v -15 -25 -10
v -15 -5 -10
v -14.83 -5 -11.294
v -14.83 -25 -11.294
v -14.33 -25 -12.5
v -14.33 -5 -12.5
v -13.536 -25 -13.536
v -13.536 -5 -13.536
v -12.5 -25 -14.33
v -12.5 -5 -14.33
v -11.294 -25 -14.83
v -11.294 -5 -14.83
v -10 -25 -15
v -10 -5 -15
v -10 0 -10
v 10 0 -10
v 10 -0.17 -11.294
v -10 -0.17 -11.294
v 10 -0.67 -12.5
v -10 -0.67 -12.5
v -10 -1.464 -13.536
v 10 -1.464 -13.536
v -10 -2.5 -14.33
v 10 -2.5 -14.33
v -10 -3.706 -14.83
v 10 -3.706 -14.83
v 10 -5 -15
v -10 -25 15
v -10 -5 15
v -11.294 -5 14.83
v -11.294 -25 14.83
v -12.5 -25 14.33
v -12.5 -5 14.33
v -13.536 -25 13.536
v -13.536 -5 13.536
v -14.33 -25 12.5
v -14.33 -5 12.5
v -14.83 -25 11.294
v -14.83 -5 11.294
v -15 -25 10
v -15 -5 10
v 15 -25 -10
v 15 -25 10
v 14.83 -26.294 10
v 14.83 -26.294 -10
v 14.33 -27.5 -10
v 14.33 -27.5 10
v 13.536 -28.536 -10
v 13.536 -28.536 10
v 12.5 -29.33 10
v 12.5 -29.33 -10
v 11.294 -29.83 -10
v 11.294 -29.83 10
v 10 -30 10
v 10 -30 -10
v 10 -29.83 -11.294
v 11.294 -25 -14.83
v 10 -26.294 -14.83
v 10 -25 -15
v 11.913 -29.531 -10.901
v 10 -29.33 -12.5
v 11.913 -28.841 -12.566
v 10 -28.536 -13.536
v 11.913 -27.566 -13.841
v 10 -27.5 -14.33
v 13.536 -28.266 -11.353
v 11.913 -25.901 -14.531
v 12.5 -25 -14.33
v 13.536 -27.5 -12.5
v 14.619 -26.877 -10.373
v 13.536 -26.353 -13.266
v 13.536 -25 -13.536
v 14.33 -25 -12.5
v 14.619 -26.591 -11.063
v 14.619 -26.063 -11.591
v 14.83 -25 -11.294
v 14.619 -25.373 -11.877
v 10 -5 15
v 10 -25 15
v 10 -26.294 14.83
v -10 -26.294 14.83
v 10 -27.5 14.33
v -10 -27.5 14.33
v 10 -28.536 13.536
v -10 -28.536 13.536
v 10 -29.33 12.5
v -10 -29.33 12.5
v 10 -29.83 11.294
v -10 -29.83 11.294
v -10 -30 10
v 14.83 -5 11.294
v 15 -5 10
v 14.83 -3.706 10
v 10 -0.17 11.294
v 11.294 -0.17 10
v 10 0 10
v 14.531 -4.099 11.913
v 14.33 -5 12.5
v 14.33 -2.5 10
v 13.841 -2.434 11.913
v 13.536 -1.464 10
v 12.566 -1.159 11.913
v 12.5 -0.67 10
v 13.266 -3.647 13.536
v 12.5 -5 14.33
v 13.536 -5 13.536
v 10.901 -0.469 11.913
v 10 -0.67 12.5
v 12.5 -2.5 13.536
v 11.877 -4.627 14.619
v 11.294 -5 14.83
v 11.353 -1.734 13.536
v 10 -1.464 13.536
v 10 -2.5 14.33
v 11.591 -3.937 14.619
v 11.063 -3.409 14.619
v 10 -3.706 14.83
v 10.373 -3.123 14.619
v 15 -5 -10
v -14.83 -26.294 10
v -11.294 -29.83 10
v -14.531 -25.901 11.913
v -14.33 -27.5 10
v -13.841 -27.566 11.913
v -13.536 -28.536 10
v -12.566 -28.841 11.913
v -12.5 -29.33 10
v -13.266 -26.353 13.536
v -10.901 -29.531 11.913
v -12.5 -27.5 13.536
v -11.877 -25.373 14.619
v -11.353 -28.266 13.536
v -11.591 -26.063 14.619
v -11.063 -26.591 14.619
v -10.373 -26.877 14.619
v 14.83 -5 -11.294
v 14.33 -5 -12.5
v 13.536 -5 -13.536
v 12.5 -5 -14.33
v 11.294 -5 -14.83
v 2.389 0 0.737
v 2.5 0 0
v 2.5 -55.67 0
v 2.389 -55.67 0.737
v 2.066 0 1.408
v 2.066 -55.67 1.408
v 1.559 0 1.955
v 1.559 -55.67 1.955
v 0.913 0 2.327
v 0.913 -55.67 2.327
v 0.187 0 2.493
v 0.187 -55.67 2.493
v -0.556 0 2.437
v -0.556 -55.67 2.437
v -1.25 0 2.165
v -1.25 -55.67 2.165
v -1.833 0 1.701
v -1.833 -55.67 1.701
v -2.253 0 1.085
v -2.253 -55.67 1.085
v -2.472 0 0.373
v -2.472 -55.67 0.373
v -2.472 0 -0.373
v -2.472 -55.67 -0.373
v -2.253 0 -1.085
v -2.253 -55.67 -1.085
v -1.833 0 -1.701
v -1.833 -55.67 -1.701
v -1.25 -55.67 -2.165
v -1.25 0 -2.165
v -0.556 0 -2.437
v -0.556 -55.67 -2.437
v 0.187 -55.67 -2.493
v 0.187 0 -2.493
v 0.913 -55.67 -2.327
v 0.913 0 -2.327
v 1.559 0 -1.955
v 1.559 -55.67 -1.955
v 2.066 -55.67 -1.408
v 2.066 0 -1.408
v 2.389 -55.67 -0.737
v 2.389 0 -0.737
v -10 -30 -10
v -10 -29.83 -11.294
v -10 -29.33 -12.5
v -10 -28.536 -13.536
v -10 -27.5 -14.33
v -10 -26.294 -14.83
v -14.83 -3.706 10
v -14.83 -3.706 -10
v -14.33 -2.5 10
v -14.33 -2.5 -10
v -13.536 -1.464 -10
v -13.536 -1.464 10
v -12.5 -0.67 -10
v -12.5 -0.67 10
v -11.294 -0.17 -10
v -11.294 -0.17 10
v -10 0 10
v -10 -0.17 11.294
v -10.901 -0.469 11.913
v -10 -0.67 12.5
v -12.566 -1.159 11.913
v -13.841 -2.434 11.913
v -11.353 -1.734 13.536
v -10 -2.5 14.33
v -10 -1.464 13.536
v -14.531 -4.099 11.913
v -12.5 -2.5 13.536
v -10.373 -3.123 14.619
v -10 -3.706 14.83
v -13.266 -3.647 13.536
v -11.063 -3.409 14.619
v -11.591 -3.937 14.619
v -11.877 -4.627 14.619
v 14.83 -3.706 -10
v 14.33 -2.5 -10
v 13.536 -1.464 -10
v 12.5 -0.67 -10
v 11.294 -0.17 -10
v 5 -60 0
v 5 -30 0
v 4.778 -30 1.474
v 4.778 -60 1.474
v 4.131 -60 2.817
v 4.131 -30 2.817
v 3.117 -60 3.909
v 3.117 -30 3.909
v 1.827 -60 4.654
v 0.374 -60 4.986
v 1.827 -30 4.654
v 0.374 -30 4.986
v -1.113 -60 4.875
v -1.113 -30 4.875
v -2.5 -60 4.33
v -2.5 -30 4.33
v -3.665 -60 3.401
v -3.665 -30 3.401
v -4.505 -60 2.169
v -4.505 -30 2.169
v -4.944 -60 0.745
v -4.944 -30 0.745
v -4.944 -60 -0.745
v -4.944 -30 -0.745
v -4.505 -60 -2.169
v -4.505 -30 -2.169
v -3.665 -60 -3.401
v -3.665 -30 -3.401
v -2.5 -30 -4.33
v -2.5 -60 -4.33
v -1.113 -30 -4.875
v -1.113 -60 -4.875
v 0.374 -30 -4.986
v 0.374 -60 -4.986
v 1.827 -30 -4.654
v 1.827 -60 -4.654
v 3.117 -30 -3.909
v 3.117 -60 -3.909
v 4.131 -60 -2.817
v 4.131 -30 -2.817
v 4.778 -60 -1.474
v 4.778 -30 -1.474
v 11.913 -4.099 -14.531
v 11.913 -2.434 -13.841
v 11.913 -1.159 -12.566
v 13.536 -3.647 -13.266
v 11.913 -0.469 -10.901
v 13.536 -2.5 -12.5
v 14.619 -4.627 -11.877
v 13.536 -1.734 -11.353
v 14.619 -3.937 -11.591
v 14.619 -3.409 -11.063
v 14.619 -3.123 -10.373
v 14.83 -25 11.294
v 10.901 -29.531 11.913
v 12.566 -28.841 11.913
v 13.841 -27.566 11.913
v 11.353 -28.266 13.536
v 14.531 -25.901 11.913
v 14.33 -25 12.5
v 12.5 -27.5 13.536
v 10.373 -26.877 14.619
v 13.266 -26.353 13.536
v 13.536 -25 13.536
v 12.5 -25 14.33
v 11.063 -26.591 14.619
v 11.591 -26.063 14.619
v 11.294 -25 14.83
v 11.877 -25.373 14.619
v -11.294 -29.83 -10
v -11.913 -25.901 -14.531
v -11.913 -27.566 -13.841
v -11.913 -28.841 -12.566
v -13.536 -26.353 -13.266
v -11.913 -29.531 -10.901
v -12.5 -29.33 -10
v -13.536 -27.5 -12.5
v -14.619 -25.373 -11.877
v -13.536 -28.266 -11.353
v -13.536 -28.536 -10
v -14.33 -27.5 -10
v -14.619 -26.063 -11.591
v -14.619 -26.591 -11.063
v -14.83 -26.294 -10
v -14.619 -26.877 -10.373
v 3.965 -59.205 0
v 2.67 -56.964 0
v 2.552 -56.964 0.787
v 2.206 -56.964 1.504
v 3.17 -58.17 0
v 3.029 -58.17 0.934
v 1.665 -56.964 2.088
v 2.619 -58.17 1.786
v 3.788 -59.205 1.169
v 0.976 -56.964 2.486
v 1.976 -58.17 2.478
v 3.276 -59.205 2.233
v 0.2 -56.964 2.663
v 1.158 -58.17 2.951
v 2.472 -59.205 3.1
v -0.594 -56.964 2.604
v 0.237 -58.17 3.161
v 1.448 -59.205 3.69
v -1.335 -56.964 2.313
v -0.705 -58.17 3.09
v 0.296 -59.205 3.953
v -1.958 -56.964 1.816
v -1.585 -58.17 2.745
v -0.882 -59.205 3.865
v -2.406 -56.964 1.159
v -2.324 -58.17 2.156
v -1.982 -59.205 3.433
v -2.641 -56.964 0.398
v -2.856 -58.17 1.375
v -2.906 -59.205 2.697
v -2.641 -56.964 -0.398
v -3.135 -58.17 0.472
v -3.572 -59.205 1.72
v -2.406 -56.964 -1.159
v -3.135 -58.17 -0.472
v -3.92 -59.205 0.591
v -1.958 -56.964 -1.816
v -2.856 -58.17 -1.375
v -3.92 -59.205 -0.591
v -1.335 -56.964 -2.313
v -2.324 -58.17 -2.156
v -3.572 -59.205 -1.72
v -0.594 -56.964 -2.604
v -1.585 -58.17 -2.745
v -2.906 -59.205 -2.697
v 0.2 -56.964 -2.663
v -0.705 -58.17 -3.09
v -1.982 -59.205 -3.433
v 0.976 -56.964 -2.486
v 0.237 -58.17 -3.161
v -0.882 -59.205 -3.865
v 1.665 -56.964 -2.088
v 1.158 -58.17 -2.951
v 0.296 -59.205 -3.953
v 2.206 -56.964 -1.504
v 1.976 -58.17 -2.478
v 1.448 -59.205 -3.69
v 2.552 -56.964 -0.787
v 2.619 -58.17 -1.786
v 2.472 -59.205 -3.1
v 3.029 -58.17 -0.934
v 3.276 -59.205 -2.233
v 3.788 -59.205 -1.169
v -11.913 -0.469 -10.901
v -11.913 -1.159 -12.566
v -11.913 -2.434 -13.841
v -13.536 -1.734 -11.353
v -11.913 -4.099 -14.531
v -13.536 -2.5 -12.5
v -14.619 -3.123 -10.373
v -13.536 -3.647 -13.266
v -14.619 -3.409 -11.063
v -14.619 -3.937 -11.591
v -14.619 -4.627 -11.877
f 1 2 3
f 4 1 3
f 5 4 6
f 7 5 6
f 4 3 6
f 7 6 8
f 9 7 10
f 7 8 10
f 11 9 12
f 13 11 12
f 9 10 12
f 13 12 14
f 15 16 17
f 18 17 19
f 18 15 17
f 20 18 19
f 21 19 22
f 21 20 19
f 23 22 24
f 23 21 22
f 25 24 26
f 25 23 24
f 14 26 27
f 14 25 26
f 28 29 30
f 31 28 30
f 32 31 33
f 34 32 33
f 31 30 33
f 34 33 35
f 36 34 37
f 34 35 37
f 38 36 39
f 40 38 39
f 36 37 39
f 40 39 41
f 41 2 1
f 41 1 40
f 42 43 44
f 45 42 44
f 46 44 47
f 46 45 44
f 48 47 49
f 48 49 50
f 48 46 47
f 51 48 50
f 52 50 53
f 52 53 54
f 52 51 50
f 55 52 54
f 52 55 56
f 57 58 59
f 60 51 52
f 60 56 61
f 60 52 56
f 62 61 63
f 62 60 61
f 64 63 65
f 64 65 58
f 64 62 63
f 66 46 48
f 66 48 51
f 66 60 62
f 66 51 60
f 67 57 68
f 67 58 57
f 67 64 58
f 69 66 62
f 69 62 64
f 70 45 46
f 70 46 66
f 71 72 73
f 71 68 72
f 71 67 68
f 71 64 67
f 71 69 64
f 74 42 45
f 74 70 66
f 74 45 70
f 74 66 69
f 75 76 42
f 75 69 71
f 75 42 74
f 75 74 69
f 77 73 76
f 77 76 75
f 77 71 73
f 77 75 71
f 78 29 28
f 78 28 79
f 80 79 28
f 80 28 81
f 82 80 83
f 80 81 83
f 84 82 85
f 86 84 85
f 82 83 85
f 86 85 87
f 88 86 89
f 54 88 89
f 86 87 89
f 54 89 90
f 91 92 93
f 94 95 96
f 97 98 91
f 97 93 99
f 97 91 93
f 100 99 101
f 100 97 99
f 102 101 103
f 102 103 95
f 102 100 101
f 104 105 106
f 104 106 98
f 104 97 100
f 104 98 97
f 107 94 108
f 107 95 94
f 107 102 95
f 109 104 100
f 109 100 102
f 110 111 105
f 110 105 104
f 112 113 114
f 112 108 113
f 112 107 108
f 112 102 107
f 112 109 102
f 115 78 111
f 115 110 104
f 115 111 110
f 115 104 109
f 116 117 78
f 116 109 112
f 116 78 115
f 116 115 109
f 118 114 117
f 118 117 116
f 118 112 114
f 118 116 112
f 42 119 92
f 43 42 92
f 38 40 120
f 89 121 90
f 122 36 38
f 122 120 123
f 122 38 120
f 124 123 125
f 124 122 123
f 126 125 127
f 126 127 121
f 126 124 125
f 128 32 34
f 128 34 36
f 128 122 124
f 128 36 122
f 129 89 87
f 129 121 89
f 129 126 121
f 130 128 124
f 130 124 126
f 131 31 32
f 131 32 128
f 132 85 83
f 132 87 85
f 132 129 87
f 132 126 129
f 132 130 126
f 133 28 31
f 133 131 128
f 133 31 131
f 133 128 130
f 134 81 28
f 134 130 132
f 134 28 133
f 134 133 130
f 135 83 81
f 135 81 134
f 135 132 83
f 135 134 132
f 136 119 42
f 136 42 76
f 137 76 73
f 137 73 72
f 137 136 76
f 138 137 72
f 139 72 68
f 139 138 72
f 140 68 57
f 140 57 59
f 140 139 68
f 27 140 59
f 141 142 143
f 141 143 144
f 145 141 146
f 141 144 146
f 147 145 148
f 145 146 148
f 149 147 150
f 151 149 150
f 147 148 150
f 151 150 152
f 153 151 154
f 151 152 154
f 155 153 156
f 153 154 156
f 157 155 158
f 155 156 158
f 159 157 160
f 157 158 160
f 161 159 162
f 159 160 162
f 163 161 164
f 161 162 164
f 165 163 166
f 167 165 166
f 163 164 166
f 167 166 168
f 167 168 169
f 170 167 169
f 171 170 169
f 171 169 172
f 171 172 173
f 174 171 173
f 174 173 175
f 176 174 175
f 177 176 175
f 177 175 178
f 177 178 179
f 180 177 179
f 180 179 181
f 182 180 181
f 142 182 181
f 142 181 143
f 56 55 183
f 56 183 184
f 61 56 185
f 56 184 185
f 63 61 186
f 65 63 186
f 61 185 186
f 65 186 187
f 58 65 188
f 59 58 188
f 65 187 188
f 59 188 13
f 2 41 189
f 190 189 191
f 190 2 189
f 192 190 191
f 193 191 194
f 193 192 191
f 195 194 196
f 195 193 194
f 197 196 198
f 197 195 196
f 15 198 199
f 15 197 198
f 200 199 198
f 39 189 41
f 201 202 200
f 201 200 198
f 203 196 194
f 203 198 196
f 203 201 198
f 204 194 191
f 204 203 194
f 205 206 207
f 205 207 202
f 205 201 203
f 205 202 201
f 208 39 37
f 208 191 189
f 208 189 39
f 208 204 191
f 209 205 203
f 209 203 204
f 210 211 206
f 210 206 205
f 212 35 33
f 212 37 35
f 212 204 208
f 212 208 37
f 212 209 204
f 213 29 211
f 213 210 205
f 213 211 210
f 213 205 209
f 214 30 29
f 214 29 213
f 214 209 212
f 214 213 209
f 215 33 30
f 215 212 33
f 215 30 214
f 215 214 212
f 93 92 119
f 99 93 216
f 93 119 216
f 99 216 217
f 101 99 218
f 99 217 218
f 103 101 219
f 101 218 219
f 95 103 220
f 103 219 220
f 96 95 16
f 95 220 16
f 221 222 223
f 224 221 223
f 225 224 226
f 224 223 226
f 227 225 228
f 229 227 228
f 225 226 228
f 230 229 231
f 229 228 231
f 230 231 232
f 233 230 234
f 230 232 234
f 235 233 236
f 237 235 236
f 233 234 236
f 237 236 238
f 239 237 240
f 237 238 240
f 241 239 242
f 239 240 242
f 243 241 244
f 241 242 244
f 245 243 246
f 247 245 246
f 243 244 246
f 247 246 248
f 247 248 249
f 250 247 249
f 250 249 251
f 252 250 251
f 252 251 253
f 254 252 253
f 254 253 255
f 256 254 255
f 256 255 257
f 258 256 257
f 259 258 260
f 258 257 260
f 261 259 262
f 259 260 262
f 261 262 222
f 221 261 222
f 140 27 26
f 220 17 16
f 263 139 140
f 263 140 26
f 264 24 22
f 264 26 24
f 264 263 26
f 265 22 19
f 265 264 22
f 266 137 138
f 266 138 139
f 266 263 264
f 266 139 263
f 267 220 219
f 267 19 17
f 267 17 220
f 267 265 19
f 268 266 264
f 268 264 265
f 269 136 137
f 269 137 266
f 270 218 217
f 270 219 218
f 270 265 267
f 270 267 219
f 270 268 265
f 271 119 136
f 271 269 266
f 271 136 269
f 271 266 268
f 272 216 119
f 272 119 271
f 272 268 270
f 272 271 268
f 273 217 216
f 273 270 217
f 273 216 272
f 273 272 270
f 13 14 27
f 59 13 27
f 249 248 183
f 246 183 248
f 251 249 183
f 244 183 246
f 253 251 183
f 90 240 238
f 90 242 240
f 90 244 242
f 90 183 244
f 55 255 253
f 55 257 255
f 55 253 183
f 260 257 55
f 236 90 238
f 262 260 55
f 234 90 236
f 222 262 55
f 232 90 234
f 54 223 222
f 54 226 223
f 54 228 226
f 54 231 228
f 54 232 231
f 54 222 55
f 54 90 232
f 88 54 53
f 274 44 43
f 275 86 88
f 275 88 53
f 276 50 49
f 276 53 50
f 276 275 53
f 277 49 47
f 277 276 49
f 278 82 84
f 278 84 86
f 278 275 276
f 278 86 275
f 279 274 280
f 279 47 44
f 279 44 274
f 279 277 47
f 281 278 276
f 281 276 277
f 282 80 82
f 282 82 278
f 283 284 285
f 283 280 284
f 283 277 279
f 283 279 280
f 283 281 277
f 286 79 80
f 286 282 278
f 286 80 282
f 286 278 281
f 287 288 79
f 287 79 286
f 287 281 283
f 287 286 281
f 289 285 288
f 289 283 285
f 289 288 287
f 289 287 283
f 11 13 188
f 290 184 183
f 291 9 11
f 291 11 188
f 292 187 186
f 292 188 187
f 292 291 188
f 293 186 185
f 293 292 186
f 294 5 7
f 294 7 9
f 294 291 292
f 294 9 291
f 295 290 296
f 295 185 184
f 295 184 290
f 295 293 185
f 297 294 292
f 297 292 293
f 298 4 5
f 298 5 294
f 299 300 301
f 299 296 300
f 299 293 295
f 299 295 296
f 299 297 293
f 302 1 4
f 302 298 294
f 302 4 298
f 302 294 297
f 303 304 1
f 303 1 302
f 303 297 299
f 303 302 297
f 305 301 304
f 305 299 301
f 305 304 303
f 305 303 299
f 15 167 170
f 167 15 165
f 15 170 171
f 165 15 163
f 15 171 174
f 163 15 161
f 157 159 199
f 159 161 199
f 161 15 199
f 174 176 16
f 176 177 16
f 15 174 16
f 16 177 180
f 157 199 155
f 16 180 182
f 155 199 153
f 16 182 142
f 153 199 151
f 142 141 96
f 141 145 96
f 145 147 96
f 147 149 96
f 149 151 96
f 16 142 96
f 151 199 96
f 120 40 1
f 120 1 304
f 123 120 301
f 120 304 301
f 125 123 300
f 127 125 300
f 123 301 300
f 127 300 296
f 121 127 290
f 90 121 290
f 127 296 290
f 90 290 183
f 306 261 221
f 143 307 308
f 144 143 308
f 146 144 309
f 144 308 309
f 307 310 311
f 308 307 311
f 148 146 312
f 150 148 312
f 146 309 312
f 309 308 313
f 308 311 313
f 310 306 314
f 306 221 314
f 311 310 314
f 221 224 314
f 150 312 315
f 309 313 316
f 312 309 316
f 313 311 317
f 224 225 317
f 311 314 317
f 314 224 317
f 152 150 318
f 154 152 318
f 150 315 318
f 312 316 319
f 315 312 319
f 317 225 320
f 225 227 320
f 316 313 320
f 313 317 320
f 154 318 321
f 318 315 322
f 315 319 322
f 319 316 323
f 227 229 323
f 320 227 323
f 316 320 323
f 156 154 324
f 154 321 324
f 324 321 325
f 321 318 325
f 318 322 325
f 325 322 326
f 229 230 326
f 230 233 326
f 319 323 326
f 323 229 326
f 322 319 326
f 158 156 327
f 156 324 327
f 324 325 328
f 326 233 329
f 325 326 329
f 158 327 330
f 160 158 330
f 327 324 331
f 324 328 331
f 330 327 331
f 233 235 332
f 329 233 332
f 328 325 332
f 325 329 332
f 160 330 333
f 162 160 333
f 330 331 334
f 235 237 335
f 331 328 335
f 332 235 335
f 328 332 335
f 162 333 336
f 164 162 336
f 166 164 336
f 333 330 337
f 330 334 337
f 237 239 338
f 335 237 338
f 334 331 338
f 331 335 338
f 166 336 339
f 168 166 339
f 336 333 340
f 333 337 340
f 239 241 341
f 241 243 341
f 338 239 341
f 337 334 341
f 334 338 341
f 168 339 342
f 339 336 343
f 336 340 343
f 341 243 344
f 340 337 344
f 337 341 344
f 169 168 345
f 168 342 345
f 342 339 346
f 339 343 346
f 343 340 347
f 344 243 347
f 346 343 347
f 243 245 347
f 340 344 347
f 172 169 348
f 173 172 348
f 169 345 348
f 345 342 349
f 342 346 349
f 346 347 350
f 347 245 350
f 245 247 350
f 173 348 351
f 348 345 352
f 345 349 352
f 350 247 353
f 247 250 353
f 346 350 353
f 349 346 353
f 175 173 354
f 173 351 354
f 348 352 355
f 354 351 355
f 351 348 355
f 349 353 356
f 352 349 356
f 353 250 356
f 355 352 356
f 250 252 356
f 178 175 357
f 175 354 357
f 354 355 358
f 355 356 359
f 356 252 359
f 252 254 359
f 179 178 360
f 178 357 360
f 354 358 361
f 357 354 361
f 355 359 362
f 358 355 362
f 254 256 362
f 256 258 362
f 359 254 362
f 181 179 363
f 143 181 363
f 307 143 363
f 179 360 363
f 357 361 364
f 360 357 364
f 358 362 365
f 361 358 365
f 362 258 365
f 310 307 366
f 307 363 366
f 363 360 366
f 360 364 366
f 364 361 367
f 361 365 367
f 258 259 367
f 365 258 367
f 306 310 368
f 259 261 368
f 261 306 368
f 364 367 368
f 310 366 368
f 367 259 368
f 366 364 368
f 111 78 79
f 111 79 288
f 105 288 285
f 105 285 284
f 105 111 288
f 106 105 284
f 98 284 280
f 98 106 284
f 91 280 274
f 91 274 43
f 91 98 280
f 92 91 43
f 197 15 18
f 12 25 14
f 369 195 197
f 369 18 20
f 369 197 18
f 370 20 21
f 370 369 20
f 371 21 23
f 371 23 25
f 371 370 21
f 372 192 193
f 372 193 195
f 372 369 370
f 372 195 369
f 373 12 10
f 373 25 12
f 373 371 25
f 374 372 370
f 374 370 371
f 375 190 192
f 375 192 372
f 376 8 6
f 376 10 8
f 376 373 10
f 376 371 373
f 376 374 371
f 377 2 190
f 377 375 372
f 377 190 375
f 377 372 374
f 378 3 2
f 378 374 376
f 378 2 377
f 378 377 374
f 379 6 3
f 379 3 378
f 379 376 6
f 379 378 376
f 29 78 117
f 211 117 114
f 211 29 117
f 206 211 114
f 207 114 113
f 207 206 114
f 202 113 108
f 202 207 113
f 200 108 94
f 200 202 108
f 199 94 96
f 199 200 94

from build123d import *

# Parameters (mm, degrees)
F0_W         = 30
F0_H         = 30
F1_DEPTH     = 30
F2_R         = 5
F3_DEPTH     = 30
F4_R         = 2.5001325449
F5_DEPTH     = 60.001
F6_T1_DEPTH  = 20
F6_T3_DEPTH  = 20
F6_T5_DEPTH  = 20
F6_S9_W      = 5.1
F6_S9_H      = 5.1
F6_T10_DEPTH = 5.1
F6_S15_W     = 5.1
F6_S15_H     = 5.1
F6_T16_DEPTH = 5.1
F6_S21_W     = 5.1
F6_S21_H     = 5.1
F6_T22_DEPTH = 5.1
F6_S27_W     = 5.1
F6_S27_H     = 5.1
F6_T28_DEPTH = 5.1
F6_S33_W     = 5.1
F6_S33_H     = 5.1
F6_T34_DEPTH = 5.1
F6_S39_W     = 5.1
F6_S39_H     = 5.1
F6_T40_DEPTH = 5.1
F6_S45_W     = 5.1
F6_S45_H     = 5.1
F6_T46_DEPTH = 5.1
F6_S51_W     = 5.1
F6_S51_H     = 5.1
F6_T52_DEPTH = 5.1


# Not quite as in the source:
# - a fillet or chamfer that OpenCascade refuses, or shapes differently, is made with other operations: its cross-section is extruded or revolved along the edge and cut away or added


with BuildPart() as f1:
    # F0 (on Front) → F1 (new body)
    with BuildSketch(Plane.XZ):
        Rectangle(F0_W, F0_H)
    extrude(amount=F1_DEPTH)

    # F2 (on face) → F3 (join)
    with BuildSketch(Plane.XZ.offset(30)):
        Circle(F2_R)
    extrude(amount=F3_DEPTH)

    # F4 (on face) → F5 (cut, through all)
    with BuildSketch(Plane.XZ.offset(60)):
        Circle(F4_R)
    extrude(amount=-F5_DEPTH, mode=Mode.SUBTRACT)

    # F6: fillet of radius 5 on 13 edges, made by hand

    # F6_s2 → F6_t1 (cut)
    with BuildSketch(Plane.XZ.offset(5)):
        with BuildLine():
            ThreePointArc((10, 15), (13.5355339059, 13.5355339059), (15, 10))
            Line((15, 10), (15, 15))
            Line((15, 15), (10, 15))
        make_face()
        with BuildLine():
            ThreePointArc((-10, 15), (-13.5355339059, 13.5355339059), (-15, 10))
            Line((-15, 10), (-15, 15))
            Line((-15, 15), (-10, 15))
        make_face()
        with BuildLine():
            ThreePointArc((-15, -10), (-13.5355339059, -13.5355339059), (-10, -15))
            Line((-10, -15), (-15, -15))
            Line((-15, -15), (-15, -10))
        make_face()
        with BuildLine():
            ThreePointArc((15, -10), (13.5355339059, -13.5355339059), (10, -15))
            Line((10, -15), (15, -15))
            Line((15, -15), (15, -10))
        make_face()
    extrude(amount=F6_T1_DEPTH, mode=Mode.SUBTRACT)

    # F6_s4 → F6_t3 (cut)
    with BuildSketch(Plane.YZ.offset(-10)):
        with BuildLine():
            ThreePointArc((-25, 15), (-28.5355339059, 13.5355339059), (-30, 10))
            Line((-30, 10), (-30, 15))
            Line((-30, 15), (-25, 15))
        make_face()
        with BuildLine():
            ThreePointArc((-5, 15), (-1.4644660941, 13.5355339059), (0, 10))
            Line((0, 10), (0, 15))
            Line((0, 15), (-5, 15))
        make_face()
        with BuildLine():
            ThreePointArc((-30, -10), (-28.5355339059, -13.5355339059), (-25, -15))
            Line((-25, -15), (-30, -15))
            Line((-30, -15), (-30, -10))
        make_face()
        with BuildLine():
            ThreePointArc((0, -10), (-1.4644660941, -13.5355339059), (-5, -15))
            Line((-5, -15), (0, -15))
            Line((0, -15), (0, -10))
        make_face()
    extrude(amount=F6_T3_DEPTH, mode=Mode.SUBTRACT)

    # F6_s6 → F6_t5 (cut)
    with BuildSketch(Plane.XY.offset(-10)):
        with BuildLine():
            ThreePointArc((-15, -5), (-13.5355339059, -1.4644660941), (-10, 0))
            Line((-10, 0), (-15, 0))
            Line((-15, 0), (-15, -5))
        make_face()
        with BuildLine():
            ThreePointArc((-15, -25), (-13.5355339059, -28.5355339059), (-10, -30))
            Line((-10, -30), (-15, -30))
            Line((-15, -30), (-15, -25))
        make_face()
        with BuildLine():
            ThreePointArc((15, -5), (13.5355339059, -1.4644660941), (10, 0))
            Line((10, 0), (15, 0))
            Line((15, 0), (15, -5))
        make_face()
        with BuildLine():
            ThreePointArc((15, -25), (13.5355339059, -28.5355339059), (10, -30))
            Line((10, -30), (15, -30))
            Line((15, -30), (15, -25))
        make_face()
    extrude(amount=F6_T5_DEPTH, mode=Mode.SUBTRACT)


with BuildPart() as f6_tool8:
    # F6_s9 → F6_t10 (new body)
    with BuildSketch(Plane.XY.offset(10)):
        with Locations((12.55, -2.45)):
            Rectangle(F6_S9_W, F6_S9_H)
    extrude(amount=F6_T10_DEPTH)

    # F6_s11 → F6_t12 (revolve, cut)
    with BuildSketch(Plane(origin=(10, -5, 10), x_dir=(-0.7071067812, -0.7071067812, 0), z_dir=(-0.7071067812, 0.7071067812, 0))):
        with BuildLine():
            ThreePointArc((0, -5), (5, 0), (0, 5))
            Line((0, 5), (0, -5))
        make_face()
    revolve(axis=Axis((10, -5, 10), (0, 0, 1)), mode=Mode.SUBTRACT)


with BuildPart() as f1_1:
    add(f1.part)

    # F6_t7: cut F6_tool8
    add(f6_tool8.part, mode=Mode.SUBTRACT)


with BuildPart() as f6_tool14:
    # F6_s15 → F6_t16 (new body)
    with BuildSketch(Plane.XY.offset(10)):
        with Locations((12.55, -27.55)):
            Rectangle(F6_S15_W, F6_S15_H)
    extrude(amount=F6_T16_DEPTH)

    # F6_s17 → F6_t18 (revolve, cut)
    with BuildSketch(Plane(origin=(10, -25, 10), x_dir=(-0.7071067812, 0.7071067812, 0), z_dir=(0.7071067812, 0.7071067812, 0))):
        with BuildLine():
            ThreePointArc((0, -5), (5, 0), (0, 5))
            Line((0, 5), (0, -5))
        make_face()
    revolve(axis=Axis((10, -25, 10), (0, 0, 1)), mode=Mode.SUBTRACT)


with BuildPart() as f1_2:
    add(f1_1.part)

    # F6_t13: cut F6_tool14
    add(f6_tool14.part, mode=Mode.SUBTRACT)


with BuildPart() as f6_tool20:
    # F6_s21 → F6_t22 (new body)
    with BuildSketch(Plane.XY.offset(10)):
        with Locations((-12.55, -2.45)):
            Rectangle(F6_S21_W, F6_S21_H)
    extrude(amount=F6_T22_DEPTH)

    # F6_s23 → F6_t24 (revolve, cut)
    with BuildSketch(Plane(origin=(-10, -5, 10), x_dir=(0.7071067812, -0.7071067812, 0), z_dir=(-0.7071067812, -0.7071067812, 0))):
        with BuildLine():
            ThreePointArc((0, -5), (5, 0), (0, 5))
            Line((0, 5), (0, -5))
        make_face()
    revolve(axis=Axis((-10, -5, 10), (0, 0, 1)), mode=Mode.SUBTRACT)


with BuildPart() as f1_3:
    add(f1_2.part)

    # F6_t19: cut F6_tool20
    add(f6_tool20.part, mode=Mode.SUBTRACT)


with BuildPart() as f6_tool26:
    # F6_s27 → F6_t28 (new body)
    with BuildSketch(Plane.XY.offset(10)):
        with Locations((-12.55, -27.55)):
            Rectangle(F6_S27_W, F6_S27_H)
    extrude(amount=F6_T28_DEPTH)

    # F6_s29 → F6_t30 (revolve, cut)
    with BuildSketch(Plane(origin=(-10, -25, 10), x_dir=(0.7071067812, 0.7071067812, 0), z_dir=(0.7071067812, -0.7071067812, 0))):
        with BuildLine():
            ThreePointArc((0, -5), (5, 0), (0, 5))
            Line((0, 5), (0, -5))
        make_face()
    revolve(axis=Axis((-10, -25, 10), (0, 0, 1)), mode=Mode.SUBTRACT)


with BuildPart() as f1_4:
    add(f1_3.part)

    # F6_t25: cut F6_tool26
    add(f6_tool26.part, mode=Mode.SUBTRACT)


with BuildPart() as f6_tool32:
    # F6_s33 → F6_t34 (new body)
    with BuildSketch(Plane.YZ.offset(-10)):
        with Locations((-27.55, -12.55)):
            Rectangle(F6_S33_W, F6_S33_H)
    extrude(amount=-F6_T34_DEPTH)

    # F6_s35 → F6_t36 (revolve, cut)
    with BuildSketch(Plane(origin=(-10, -25, -10), x_dir=(0, 0.7071067812, 0.7071067812), z_dir=(0, -0.7071067812, 0.7071067812))):
        with BuildLine():
            ThreePointArc((0, -5), (5, 0), (0, 5))
            Line((0, 5), (0, -5))
        make_face()
    revolve(axis=Axis((-10, -25, -10), (-1, 0, 0)), mode=Mode.SUBTRACT)


with BuildPart() as f1_5:
    add(f1_4.part)

    # F6_t31: cut F6_tool32
    add(f6_tool32.part, mode=Mode.SUBTRACT)


with BuildPart() as f6_tool38:
    # F6_s39 → F6_t40 (new body)
    with BuildSketch(Plane.YZ.offset(10)):
        with Locations((-27.55, -12.55)):
            Rectangle(F6_S39_W, F6_S39_H)
    extrude(amount=F6_T40_DEPTH)

    # F6_s41 → F6_t42 (revolve, cut)
    with BuildSketch(Plane(origin=(10, -25, -10), x_dir=(0, 0.7071067812, 0.7071067812), z_dir=(0, 0.7071067812, -0.7071067812))):
        with BuildLine():
            ThreePointArc((0, -5), (5, 0), (0, 5))
            Line((0, 5), (0, -5))
        make_face()
    revolve(axis=Axis((10, -25, -10), (1, 0, 0)), mode=Mode.SUBTRACT)


with BuildPart() as f1_6:
    add(f1_5.part)

    # F6_t37: cut F6_tool38
    add(f6_tool38.part, mode=Mode.SUBTRACT)


with BuildPart() as f6_tool44:
    # F6_s45 → F6_t46 (new body)
    with BuildSketch(Plane.YZ.offset(-10)):
        with Locations((-2.45, -12.55)):
            Rectangle(F6_S45_W, F6_S45_H)
    extrude(amount=-F6_T46_DEPTH)

    # F6_s47 → F6_t48 (revolve, cut)
    with BuildSketch(Plane(origin=(-10, -5, -10), x_dir=(0, -0.7071067812, 0.7071067812), z_dir=(0, -0.7071067812, -0.7071067812))):
        with BuildLine():
            ThreePointArc((0, -5), (5, 0), (0, 5))
            Line((0, 5), (0, -5))
        make_face()
    revolve(axis=Axis((-10, -5, -10), (-1, 0, 0)), mode=Mode.SUBTRACT)


with BuildPart() as f1_7:
    add(f1_6.part)

    # F6_t43: cut F6_tool44
    add(f6_tool44.part, mode=Mode.SUBTRACT)


with BuildPart() as f6_tool50:
    # F6_s51 → F6_t52 (new body)
    with BuildSketch(Plane.YZ.offset(10)):
        with Locations((-2.45, -12.55)):
            Rectangle(F6_S51_W, F6_S51_H)
    extrude(amount=F6_T52_DEPTH)

    # F6_s53 → F6_t54 (revolve, cut)
    with BuildSketch(Plane(origin=(10, -5, -10), x_dir=(0, -0.7071067812, 0.7071067812), z_dir=(0, 0.7071067812, 0.7071067812))):
        with BuildLine():
            ThreePointArc((0, -5), (5, 0), (0, 5))
            Line((0, 5), (0, -5))
        make_face()
    revolve(axis=Axis((10, -5, -10), (1, 0, 0)), mode=Mode.SUBTRACT)


with BuildPart() as f1_8:
    add(f1_7.part)

    # F6_t49: cut F6_tool50
    add(f6_tool50.part, mode=Mode.SUBTRACT)

    # F6_s55 → F6_t56 (revolve, cut)
    with BuildSketch(Plane.XY):
        with BuildLine():
            ThreePointArc((2.5001325449, -55.6699495086), (3.1699672637, -58.1698832353), (5, -60))
            Line((5, -60), (2.5001325449, -60))
            Line((2.5001325449, -60), (2.5001325449, -55.6699495086))
        make_face()
    revolve(axis=Axis((0, -60, 0), (0, -1, 0)), mode=Mode.SUBTRACT)


solid = f1_8.part
